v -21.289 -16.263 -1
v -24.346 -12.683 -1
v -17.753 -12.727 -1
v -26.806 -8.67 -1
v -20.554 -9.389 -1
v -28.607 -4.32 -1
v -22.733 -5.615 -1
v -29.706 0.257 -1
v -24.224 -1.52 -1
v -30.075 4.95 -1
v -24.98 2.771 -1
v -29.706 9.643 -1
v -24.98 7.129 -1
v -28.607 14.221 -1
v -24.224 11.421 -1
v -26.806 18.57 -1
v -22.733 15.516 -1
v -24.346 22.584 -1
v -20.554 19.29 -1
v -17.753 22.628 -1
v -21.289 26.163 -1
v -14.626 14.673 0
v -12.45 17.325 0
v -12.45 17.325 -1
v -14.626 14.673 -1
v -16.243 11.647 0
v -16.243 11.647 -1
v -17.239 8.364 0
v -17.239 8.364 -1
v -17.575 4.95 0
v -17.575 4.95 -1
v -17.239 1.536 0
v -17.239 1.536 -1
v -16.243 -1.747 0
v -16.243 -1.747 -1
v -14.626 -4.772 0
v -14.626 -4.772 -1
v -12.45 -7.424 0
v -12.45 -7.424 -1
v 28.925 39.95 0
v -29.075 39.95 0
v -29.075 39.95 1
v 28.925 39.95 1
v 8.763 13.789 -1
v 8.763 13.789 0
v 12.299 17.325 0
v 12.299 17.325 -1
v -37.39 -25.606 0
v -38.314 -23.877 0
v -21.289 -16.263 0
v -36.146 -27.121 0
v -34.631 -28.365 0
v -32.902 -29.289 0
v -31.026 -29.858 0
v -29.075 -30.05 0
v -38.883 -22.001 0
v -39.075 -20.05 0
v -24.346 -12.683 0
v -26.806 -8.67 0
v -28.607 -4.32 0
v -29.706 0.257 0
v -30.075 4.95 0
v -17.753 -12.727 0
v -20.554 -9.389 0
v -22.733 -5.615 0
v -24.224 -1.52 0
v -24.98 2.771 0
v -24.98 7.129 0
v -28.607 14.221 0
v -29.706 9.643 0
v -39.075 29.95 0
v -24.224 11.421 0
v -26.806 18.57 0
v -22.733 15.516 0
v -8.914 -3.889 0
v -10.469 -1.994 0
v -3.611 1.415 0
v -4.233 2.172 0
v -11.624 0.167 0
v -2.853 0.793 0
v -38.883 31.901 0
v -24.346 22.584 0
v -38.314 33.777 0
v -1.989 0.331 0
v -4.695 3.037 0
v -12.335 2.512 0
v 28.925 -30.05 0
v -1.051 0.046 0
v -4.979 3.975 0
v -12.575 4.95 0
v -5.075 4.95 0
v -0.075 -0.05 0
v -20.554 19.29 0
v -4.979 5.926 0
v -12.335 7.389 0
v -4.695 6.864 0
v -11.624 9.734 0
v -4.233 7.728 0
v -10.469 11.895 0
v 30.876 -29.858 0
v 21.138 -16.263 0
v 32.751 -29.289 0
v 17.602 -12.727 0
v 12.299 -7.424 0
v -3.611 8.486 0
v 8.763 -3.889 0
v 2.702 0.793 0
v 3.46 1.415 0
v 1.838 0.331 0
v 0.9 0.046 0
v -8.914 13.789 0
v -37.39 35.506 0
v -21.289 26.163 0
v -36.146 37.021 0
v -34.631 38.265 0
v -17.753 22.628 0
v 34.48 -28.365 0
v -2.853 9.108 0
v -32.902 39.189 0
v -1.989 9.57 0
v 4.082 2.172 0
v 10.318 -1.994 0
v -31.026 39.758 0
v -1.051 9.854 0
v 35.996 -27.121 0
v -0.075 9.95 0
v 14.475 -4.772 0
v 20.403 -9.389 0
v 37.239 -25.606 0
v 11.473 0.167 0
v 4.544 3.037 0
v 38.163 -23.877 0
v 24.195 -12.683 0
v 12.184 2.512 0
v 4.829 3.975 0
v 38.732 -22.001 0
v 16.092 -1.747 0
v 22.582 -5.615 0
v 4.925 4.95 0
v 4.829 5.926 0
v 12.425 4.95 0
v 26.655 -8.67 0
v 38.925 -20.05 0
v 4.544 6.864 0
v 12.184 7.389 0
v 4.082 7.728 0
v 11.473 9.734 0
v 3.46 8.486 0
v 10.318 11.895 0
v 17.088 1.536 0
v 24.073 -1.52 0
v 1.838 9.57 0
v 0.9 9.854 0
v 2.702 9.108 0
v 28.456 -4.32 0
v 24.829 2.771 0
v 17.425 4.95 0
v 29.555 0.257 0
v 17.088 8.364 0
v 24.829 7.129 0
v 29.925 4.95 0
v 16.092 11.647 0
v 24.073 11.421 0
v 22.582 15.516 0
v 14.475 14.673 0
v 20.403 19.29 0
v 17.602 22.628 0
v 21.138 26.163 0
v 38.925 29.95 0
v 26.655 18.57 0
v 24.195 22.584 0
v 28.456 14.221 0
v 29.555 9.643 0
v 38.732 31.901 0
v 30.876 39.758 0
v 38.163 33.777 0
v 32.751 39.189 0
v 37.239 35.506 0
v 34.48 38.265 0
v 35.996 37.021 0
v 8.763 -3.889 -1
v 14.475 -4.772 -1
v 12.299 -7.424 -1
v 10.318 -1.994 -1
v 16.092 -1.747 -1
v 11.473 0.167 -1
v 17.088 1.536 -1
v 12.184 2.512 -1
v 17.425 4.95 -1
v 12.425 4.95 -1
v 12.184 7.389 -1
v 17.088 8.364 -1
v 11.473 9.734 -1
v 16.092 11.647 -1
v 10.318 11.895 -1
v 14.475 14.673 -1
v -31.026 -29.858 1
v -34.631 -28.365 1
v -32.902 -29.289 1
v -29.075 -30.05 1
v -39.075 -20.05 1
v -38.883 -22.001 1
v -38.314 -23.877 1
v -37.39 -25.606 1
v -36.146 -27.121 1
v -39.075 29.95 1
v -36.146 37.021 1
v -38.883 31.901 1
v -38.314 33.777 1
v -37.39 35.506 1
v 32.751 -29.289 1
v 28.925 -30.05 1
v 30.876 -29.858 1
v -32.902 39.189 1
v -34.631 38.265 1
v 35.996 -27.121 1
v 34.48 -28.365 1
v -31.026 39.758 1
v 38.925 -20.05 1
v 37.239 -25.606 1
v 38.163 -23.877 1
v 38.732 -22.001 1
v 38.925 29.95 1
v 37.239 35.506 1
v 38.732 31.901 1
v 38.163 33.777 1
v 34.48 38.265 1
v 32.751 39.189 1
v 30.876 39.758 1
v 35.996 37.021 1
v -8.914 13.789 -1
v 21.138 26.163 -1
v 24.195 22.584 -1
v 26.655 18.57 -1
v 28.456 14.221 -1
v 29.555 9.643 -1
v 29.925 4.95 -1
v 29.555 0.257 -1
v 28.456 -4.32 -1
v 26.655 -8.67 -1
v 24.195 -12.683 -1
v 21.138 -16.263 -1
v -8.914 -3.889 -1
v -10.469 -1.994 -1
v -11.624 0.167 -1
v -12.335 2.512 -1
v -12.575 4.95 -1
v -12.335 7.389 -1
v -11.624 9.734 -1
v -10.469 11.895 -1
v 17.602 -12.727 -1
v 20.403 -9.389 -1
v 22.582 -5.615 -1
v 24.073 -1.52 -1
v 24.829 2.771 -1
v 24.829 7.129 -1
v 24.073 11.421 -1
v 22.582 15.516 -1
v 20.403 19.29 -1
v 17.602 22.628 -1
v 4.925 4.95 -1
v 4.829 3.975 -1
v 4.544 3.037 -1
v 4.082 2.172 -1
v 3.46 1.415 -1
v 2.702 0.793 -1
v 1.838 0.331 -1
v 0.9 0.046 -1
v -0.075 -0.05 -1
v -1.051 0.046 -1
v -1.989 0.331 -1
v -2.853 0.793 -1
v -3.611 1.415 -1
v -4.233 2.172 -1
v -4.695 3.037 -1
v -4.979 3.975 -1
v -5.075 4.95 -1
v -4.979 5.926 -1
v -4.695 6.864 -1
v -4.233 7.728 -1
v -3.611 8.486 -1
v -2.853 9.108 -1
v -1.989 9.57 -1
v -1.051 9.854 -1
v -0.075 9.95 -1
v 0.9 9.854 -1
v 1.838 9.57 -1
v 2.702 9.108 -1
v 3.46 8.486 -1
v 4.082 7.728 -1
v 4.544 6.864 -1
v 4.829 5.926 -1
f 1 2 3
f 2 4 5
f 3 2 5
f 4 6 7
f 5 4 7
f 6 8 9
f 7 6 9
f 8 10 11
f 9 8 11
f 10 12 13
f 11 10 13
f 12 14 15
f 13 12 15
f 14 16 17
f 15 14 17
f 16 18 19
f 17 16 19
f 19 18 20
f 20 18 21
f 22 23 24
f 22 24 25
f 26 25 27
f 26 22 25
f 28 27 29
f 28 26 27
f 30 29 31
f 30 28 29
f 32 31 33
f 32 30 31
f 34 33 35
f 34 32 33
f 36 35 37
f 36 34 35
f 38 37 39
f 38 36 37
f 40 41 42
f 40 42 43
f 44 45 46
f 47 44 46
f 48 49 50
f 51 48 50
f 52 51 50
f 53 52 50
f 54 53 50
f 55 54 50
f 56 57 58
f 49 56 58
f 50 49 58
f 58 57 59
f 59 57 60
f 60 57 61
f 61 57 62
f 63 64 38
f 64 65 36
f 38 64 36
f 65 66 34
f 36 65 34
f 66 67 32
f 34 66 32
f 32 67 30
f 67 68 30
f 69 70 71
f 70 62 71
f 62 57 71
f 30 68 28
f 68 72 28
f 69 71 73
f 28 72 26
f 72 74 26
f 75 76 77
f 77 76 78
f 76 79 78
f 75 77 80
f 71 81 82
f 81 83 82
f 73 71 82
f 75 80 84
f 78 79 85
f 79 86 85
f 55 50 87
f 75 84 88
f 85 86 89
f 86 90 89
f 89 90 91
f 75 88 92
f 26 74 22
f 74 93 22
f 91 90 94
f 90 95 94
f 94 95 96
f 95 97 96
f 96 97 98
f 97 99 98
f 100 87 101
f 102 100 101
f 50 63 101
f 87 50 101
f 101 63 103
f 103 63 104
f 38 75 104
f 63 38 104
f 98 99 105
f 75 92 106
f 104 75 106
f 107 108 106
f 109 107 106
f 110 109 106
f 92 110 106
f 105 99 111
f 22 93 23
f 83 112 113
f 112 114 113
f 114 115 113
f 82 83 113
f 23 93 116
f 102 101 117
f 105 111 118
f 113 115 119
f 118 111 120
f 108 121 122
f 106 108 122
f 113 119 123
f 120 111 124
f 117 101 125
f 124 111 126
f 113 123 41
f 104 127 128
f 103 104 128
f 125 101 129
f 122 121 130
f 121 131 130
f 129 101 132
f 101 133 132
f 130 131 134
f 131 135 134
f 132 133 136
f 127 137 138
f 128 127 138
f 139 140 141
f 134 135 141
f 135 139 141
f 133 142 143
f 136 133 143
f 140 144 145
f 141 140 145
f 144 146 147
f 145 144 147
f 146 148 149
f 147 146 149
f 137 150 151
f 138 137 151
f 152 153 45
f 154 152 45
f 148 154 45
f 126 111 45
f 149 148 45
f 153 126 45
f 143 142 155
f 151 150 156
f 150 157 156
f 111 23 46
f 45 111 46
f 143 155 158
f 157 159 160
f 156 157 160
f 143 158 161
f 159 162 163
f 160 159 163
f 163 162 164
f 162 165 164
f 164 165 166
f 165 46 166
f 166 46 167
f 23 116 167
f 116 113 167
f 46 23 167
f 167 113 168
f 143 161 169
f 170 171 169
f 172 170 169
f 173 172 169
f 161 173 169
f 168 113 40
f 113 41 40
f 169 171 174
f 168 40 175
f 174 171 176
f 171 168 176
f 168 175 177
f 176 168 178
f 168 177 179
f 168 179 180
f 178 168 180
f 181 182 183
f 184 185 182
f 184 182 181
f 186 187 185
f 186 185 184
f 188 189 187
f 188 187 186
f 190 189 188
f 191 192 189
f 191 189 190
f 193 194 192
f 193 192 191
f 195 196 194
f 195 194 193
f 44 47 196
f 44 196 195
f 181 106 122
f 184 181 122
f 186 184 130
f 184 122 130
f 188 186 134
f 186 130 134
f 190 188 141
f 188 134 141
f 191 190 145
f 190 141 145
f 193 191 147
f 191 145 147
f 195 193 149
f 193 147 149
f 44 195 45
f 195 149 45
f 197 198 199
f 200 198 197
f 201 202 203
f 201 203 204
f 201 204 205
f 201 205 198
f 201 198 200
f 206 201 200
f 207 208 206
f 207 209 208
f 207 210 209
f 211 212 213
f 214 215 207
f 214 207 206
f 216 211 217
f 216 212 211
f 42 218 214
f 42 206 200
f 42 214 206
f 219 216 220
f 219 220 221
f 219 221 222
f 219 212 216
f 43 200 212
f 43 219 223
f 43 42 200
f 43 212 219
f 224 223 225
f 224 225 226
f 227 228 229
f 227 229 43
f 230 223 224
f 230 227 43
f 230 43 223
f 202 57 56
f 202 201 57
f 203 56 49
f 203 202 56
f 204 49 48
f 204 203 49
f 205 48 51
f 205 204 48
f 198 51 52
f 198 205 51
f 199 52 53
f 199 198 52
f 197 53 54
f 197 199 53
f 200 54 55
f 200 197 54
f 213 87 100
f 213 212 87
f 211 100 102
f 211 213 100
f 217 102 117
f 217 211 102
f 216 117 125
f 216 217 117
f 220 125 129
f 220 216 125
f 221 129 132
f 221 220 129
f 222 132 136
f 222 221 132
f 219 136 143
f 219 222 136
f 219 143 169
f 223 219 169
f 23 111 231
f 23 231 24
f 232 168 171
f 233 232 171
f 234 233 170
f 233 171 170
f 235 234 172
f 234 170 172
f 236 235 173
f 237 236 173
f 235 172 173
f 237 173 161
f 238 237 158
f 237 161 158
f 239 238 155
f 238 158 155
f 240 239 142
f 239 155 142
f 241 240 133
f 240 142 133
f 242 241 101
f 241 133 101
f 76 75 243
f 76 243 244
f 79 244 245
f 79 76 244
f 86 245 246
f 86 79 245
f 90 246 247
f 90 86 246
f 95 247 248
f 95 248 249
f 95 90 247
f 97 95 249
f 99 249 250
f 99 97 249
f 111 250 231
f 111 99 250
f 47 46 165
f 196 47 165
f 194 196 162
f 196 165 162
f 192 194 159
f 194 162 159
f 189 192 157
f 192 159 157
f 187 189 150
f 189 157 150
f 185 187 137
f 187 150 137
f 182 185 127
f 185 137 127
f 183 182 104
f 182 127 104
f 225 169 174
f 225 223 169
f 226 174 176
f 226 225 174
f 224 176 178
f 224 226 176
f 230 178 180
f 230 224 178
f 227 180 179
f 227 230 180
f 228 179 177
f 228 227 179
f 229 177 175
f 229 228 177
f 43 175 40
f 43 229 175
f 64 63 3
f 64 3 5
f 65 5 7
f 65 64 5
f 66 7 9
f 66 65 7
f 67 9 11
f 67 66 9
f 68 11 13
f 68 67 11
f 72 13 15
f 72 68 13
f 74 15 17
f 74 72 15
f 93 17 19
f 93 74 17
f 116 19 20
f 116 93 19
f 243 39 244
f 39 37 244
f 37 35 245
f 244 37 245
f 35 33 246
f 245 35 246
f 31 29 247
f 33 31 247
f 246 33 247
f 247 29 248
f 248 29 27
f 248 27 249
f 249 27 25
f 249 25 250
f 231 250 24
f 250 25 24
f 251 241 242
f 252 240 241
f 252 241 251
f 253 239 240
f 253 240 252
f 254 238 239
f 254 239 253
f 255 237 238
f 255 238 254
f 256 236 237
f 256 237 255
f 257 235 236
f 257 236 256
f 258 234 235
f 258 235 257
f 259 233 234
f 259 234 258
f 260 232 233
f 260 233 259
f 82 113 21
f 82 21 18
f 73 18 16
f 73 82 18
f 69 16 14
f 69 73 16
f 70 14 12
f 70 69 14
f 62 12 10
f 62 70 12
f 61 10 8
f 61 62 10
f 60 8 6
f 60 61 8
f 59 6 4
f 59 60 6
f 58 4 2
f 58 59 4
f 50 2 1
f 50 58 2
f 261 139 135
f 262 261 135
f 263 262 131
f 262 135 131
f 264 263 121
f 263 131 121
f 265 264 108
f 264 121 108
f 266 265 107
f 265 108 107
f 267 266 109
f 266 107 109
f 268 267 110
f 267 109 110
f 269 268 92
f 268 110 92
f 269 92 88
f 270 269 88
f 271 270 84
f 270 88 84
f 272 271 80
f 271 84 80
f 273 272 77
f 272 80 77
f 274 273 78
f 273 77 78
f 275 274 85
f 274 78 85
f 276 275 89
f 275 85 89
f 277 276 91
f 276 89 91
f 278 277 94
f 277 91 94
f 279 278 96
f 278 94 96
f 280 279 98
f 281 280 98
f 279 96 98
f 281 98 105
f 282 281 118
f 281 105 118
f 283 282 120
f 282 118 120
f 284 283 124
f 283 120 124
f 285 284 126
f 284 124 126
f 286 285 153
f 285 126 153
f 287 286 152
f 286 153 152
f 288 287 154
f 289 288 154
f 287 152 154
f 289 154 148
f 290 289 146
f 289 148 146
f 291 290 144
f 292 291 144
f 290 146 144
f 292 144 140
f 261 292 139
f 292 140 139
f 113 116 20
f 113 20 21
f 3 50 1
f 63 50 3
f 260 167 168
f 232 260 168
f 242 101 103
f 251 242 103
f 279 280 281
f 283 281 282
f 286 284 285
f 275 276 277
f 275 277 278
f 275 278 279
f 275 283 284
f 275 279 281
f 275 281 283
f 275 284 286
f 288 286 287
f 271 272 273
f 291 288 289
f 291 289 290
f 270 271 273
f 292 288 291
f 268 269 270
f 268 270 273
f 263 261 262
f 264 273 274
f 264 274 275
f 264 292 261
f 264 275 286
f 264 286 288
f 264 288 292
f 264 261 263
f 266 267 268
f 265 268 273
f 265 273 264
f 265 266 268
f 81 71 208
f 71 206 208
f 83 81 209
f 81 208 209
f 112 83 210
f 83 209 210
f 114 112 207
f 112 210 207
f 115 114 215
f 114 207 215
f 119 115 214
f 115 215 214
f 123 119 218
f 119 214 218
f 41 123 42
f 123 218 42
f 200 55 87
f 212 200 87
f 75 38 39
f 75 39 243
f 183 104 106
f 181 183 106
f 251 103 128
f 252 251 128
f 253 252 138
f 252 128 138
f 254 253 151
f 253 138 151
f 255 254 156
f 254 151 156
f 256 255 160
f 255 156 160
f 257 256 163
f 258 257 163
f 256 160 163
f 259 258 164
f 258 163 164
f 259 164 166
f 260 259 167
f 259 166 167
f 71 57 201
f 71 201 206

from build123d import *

# Parameters (mm, degrees)
SKETCH1_W           = 78
SKETCH1_H           = 70
BOSS_EXTRUDE1_DEPTH = 1
FILLET1_R           = 10
SKETCH2_R           = 5
BOSS_EXTRUDE3_DEPTH = 1


with BuildPart() as part:
    # Sketch1 → Boss-Extrude1 (new body)
    with BuildSketch(Plane.XY):
        with Locations((-0.075399098, 4.950190099)):
            Rectangle(SKETCH1_W, SKETCH1_H)
    extrude(amount=BOSS_EXTRUDE1_DEPTH)

    # Fillet1
    fillet1_edges = [part.edges().sort_by_distance(p)[0] for p in [
        (38.924600902, -30.049809901, 0.5),
        (-39.075399098, -30.049809901, 0.5),
        (-39.075399098, 39.950190099, 0.5),
        (38.924600902, 39.950190099, 0.5),
    ]]
    fillet(fillet1_edges, radius=FILLET1_R)

    # Sketch2 → Boss-Extrude3 (add)
    with BuildSketch(Plane(origin=(0, 0, 0), x_dir=(-1, 0, 0), z_dir=(0, 0, -1))):
        with BuildLine():
            Line((12.449767768, -7.424178572), (8.914233862, -3.888644666))
            ThreePointArc((8.914233862, -3.888644666), (12.575399098, 4.950190099), (8.914233862, 13.789024864))
            Line((8.914233862, 13.789024864), (12.449767768, 17.32455877))
            ThreePointArc((12.449767768, 17.32455877), (17.575399098, 4.950190099), (12.449767768, -7.424178572))
        make_face()
        with Locations(Location((0.075399098, 4.950190099, 0), (0, 0, 180))):
            Circle(SKETCH2_R)
        with BuildLine():
            Line((21.288602533, -16.263013337), (17.753068627, -12.727479431))
            ThreePointArc((17.753068627, -12.727479431), (25.075399098, 4.950190099), (17.753068627, 22.627859629))
            Line((17.753068627, 22.627859629), (21.288602533, 26.163393535))
            ThreePointArc((21.288602533, 26.163393535), (30.075399098, 4.950190099), (21.288602533, -16.263013337))
        make_face()
        with BuildLine():
            Line((-12.298969573, -7.424178572), (-8.763435667, -3.888644666))
            ThreePointArc((-8.763435667, -3.888644666), (-12.424600902, 4.950190099), (-8.763435667, 13.789024864))
            Line((-8.763435667, 13.789024864), (-12.298969573, 17.32455877))
            ThreePointArc((-12.298969573, 17.32455877), (-17.424600902, 4.950190099), (-12.298969573, -7.424178572))
        make_face()
        with BuildLine():
            Line((-21.137804338, -16.263013337), (-17.602270432, -12.727479431))
            ThreePointArc((-17.602270432, -12.727479431), (-24.924600902, 4.950190099), (-17.602270432, 22.627859629))
            Line((-17.602270432, 22.627859629), (-21.137804338, 26.163393535))
            ThreePointArc((-21.137804338, 26.163393535), (-29.924600902, 4.950190099), (-21.137804338, -16.263013337))
        make_face()
    extrude(amount=BOSS_EXTRUDE3_DEPTH)


solid = part.part
